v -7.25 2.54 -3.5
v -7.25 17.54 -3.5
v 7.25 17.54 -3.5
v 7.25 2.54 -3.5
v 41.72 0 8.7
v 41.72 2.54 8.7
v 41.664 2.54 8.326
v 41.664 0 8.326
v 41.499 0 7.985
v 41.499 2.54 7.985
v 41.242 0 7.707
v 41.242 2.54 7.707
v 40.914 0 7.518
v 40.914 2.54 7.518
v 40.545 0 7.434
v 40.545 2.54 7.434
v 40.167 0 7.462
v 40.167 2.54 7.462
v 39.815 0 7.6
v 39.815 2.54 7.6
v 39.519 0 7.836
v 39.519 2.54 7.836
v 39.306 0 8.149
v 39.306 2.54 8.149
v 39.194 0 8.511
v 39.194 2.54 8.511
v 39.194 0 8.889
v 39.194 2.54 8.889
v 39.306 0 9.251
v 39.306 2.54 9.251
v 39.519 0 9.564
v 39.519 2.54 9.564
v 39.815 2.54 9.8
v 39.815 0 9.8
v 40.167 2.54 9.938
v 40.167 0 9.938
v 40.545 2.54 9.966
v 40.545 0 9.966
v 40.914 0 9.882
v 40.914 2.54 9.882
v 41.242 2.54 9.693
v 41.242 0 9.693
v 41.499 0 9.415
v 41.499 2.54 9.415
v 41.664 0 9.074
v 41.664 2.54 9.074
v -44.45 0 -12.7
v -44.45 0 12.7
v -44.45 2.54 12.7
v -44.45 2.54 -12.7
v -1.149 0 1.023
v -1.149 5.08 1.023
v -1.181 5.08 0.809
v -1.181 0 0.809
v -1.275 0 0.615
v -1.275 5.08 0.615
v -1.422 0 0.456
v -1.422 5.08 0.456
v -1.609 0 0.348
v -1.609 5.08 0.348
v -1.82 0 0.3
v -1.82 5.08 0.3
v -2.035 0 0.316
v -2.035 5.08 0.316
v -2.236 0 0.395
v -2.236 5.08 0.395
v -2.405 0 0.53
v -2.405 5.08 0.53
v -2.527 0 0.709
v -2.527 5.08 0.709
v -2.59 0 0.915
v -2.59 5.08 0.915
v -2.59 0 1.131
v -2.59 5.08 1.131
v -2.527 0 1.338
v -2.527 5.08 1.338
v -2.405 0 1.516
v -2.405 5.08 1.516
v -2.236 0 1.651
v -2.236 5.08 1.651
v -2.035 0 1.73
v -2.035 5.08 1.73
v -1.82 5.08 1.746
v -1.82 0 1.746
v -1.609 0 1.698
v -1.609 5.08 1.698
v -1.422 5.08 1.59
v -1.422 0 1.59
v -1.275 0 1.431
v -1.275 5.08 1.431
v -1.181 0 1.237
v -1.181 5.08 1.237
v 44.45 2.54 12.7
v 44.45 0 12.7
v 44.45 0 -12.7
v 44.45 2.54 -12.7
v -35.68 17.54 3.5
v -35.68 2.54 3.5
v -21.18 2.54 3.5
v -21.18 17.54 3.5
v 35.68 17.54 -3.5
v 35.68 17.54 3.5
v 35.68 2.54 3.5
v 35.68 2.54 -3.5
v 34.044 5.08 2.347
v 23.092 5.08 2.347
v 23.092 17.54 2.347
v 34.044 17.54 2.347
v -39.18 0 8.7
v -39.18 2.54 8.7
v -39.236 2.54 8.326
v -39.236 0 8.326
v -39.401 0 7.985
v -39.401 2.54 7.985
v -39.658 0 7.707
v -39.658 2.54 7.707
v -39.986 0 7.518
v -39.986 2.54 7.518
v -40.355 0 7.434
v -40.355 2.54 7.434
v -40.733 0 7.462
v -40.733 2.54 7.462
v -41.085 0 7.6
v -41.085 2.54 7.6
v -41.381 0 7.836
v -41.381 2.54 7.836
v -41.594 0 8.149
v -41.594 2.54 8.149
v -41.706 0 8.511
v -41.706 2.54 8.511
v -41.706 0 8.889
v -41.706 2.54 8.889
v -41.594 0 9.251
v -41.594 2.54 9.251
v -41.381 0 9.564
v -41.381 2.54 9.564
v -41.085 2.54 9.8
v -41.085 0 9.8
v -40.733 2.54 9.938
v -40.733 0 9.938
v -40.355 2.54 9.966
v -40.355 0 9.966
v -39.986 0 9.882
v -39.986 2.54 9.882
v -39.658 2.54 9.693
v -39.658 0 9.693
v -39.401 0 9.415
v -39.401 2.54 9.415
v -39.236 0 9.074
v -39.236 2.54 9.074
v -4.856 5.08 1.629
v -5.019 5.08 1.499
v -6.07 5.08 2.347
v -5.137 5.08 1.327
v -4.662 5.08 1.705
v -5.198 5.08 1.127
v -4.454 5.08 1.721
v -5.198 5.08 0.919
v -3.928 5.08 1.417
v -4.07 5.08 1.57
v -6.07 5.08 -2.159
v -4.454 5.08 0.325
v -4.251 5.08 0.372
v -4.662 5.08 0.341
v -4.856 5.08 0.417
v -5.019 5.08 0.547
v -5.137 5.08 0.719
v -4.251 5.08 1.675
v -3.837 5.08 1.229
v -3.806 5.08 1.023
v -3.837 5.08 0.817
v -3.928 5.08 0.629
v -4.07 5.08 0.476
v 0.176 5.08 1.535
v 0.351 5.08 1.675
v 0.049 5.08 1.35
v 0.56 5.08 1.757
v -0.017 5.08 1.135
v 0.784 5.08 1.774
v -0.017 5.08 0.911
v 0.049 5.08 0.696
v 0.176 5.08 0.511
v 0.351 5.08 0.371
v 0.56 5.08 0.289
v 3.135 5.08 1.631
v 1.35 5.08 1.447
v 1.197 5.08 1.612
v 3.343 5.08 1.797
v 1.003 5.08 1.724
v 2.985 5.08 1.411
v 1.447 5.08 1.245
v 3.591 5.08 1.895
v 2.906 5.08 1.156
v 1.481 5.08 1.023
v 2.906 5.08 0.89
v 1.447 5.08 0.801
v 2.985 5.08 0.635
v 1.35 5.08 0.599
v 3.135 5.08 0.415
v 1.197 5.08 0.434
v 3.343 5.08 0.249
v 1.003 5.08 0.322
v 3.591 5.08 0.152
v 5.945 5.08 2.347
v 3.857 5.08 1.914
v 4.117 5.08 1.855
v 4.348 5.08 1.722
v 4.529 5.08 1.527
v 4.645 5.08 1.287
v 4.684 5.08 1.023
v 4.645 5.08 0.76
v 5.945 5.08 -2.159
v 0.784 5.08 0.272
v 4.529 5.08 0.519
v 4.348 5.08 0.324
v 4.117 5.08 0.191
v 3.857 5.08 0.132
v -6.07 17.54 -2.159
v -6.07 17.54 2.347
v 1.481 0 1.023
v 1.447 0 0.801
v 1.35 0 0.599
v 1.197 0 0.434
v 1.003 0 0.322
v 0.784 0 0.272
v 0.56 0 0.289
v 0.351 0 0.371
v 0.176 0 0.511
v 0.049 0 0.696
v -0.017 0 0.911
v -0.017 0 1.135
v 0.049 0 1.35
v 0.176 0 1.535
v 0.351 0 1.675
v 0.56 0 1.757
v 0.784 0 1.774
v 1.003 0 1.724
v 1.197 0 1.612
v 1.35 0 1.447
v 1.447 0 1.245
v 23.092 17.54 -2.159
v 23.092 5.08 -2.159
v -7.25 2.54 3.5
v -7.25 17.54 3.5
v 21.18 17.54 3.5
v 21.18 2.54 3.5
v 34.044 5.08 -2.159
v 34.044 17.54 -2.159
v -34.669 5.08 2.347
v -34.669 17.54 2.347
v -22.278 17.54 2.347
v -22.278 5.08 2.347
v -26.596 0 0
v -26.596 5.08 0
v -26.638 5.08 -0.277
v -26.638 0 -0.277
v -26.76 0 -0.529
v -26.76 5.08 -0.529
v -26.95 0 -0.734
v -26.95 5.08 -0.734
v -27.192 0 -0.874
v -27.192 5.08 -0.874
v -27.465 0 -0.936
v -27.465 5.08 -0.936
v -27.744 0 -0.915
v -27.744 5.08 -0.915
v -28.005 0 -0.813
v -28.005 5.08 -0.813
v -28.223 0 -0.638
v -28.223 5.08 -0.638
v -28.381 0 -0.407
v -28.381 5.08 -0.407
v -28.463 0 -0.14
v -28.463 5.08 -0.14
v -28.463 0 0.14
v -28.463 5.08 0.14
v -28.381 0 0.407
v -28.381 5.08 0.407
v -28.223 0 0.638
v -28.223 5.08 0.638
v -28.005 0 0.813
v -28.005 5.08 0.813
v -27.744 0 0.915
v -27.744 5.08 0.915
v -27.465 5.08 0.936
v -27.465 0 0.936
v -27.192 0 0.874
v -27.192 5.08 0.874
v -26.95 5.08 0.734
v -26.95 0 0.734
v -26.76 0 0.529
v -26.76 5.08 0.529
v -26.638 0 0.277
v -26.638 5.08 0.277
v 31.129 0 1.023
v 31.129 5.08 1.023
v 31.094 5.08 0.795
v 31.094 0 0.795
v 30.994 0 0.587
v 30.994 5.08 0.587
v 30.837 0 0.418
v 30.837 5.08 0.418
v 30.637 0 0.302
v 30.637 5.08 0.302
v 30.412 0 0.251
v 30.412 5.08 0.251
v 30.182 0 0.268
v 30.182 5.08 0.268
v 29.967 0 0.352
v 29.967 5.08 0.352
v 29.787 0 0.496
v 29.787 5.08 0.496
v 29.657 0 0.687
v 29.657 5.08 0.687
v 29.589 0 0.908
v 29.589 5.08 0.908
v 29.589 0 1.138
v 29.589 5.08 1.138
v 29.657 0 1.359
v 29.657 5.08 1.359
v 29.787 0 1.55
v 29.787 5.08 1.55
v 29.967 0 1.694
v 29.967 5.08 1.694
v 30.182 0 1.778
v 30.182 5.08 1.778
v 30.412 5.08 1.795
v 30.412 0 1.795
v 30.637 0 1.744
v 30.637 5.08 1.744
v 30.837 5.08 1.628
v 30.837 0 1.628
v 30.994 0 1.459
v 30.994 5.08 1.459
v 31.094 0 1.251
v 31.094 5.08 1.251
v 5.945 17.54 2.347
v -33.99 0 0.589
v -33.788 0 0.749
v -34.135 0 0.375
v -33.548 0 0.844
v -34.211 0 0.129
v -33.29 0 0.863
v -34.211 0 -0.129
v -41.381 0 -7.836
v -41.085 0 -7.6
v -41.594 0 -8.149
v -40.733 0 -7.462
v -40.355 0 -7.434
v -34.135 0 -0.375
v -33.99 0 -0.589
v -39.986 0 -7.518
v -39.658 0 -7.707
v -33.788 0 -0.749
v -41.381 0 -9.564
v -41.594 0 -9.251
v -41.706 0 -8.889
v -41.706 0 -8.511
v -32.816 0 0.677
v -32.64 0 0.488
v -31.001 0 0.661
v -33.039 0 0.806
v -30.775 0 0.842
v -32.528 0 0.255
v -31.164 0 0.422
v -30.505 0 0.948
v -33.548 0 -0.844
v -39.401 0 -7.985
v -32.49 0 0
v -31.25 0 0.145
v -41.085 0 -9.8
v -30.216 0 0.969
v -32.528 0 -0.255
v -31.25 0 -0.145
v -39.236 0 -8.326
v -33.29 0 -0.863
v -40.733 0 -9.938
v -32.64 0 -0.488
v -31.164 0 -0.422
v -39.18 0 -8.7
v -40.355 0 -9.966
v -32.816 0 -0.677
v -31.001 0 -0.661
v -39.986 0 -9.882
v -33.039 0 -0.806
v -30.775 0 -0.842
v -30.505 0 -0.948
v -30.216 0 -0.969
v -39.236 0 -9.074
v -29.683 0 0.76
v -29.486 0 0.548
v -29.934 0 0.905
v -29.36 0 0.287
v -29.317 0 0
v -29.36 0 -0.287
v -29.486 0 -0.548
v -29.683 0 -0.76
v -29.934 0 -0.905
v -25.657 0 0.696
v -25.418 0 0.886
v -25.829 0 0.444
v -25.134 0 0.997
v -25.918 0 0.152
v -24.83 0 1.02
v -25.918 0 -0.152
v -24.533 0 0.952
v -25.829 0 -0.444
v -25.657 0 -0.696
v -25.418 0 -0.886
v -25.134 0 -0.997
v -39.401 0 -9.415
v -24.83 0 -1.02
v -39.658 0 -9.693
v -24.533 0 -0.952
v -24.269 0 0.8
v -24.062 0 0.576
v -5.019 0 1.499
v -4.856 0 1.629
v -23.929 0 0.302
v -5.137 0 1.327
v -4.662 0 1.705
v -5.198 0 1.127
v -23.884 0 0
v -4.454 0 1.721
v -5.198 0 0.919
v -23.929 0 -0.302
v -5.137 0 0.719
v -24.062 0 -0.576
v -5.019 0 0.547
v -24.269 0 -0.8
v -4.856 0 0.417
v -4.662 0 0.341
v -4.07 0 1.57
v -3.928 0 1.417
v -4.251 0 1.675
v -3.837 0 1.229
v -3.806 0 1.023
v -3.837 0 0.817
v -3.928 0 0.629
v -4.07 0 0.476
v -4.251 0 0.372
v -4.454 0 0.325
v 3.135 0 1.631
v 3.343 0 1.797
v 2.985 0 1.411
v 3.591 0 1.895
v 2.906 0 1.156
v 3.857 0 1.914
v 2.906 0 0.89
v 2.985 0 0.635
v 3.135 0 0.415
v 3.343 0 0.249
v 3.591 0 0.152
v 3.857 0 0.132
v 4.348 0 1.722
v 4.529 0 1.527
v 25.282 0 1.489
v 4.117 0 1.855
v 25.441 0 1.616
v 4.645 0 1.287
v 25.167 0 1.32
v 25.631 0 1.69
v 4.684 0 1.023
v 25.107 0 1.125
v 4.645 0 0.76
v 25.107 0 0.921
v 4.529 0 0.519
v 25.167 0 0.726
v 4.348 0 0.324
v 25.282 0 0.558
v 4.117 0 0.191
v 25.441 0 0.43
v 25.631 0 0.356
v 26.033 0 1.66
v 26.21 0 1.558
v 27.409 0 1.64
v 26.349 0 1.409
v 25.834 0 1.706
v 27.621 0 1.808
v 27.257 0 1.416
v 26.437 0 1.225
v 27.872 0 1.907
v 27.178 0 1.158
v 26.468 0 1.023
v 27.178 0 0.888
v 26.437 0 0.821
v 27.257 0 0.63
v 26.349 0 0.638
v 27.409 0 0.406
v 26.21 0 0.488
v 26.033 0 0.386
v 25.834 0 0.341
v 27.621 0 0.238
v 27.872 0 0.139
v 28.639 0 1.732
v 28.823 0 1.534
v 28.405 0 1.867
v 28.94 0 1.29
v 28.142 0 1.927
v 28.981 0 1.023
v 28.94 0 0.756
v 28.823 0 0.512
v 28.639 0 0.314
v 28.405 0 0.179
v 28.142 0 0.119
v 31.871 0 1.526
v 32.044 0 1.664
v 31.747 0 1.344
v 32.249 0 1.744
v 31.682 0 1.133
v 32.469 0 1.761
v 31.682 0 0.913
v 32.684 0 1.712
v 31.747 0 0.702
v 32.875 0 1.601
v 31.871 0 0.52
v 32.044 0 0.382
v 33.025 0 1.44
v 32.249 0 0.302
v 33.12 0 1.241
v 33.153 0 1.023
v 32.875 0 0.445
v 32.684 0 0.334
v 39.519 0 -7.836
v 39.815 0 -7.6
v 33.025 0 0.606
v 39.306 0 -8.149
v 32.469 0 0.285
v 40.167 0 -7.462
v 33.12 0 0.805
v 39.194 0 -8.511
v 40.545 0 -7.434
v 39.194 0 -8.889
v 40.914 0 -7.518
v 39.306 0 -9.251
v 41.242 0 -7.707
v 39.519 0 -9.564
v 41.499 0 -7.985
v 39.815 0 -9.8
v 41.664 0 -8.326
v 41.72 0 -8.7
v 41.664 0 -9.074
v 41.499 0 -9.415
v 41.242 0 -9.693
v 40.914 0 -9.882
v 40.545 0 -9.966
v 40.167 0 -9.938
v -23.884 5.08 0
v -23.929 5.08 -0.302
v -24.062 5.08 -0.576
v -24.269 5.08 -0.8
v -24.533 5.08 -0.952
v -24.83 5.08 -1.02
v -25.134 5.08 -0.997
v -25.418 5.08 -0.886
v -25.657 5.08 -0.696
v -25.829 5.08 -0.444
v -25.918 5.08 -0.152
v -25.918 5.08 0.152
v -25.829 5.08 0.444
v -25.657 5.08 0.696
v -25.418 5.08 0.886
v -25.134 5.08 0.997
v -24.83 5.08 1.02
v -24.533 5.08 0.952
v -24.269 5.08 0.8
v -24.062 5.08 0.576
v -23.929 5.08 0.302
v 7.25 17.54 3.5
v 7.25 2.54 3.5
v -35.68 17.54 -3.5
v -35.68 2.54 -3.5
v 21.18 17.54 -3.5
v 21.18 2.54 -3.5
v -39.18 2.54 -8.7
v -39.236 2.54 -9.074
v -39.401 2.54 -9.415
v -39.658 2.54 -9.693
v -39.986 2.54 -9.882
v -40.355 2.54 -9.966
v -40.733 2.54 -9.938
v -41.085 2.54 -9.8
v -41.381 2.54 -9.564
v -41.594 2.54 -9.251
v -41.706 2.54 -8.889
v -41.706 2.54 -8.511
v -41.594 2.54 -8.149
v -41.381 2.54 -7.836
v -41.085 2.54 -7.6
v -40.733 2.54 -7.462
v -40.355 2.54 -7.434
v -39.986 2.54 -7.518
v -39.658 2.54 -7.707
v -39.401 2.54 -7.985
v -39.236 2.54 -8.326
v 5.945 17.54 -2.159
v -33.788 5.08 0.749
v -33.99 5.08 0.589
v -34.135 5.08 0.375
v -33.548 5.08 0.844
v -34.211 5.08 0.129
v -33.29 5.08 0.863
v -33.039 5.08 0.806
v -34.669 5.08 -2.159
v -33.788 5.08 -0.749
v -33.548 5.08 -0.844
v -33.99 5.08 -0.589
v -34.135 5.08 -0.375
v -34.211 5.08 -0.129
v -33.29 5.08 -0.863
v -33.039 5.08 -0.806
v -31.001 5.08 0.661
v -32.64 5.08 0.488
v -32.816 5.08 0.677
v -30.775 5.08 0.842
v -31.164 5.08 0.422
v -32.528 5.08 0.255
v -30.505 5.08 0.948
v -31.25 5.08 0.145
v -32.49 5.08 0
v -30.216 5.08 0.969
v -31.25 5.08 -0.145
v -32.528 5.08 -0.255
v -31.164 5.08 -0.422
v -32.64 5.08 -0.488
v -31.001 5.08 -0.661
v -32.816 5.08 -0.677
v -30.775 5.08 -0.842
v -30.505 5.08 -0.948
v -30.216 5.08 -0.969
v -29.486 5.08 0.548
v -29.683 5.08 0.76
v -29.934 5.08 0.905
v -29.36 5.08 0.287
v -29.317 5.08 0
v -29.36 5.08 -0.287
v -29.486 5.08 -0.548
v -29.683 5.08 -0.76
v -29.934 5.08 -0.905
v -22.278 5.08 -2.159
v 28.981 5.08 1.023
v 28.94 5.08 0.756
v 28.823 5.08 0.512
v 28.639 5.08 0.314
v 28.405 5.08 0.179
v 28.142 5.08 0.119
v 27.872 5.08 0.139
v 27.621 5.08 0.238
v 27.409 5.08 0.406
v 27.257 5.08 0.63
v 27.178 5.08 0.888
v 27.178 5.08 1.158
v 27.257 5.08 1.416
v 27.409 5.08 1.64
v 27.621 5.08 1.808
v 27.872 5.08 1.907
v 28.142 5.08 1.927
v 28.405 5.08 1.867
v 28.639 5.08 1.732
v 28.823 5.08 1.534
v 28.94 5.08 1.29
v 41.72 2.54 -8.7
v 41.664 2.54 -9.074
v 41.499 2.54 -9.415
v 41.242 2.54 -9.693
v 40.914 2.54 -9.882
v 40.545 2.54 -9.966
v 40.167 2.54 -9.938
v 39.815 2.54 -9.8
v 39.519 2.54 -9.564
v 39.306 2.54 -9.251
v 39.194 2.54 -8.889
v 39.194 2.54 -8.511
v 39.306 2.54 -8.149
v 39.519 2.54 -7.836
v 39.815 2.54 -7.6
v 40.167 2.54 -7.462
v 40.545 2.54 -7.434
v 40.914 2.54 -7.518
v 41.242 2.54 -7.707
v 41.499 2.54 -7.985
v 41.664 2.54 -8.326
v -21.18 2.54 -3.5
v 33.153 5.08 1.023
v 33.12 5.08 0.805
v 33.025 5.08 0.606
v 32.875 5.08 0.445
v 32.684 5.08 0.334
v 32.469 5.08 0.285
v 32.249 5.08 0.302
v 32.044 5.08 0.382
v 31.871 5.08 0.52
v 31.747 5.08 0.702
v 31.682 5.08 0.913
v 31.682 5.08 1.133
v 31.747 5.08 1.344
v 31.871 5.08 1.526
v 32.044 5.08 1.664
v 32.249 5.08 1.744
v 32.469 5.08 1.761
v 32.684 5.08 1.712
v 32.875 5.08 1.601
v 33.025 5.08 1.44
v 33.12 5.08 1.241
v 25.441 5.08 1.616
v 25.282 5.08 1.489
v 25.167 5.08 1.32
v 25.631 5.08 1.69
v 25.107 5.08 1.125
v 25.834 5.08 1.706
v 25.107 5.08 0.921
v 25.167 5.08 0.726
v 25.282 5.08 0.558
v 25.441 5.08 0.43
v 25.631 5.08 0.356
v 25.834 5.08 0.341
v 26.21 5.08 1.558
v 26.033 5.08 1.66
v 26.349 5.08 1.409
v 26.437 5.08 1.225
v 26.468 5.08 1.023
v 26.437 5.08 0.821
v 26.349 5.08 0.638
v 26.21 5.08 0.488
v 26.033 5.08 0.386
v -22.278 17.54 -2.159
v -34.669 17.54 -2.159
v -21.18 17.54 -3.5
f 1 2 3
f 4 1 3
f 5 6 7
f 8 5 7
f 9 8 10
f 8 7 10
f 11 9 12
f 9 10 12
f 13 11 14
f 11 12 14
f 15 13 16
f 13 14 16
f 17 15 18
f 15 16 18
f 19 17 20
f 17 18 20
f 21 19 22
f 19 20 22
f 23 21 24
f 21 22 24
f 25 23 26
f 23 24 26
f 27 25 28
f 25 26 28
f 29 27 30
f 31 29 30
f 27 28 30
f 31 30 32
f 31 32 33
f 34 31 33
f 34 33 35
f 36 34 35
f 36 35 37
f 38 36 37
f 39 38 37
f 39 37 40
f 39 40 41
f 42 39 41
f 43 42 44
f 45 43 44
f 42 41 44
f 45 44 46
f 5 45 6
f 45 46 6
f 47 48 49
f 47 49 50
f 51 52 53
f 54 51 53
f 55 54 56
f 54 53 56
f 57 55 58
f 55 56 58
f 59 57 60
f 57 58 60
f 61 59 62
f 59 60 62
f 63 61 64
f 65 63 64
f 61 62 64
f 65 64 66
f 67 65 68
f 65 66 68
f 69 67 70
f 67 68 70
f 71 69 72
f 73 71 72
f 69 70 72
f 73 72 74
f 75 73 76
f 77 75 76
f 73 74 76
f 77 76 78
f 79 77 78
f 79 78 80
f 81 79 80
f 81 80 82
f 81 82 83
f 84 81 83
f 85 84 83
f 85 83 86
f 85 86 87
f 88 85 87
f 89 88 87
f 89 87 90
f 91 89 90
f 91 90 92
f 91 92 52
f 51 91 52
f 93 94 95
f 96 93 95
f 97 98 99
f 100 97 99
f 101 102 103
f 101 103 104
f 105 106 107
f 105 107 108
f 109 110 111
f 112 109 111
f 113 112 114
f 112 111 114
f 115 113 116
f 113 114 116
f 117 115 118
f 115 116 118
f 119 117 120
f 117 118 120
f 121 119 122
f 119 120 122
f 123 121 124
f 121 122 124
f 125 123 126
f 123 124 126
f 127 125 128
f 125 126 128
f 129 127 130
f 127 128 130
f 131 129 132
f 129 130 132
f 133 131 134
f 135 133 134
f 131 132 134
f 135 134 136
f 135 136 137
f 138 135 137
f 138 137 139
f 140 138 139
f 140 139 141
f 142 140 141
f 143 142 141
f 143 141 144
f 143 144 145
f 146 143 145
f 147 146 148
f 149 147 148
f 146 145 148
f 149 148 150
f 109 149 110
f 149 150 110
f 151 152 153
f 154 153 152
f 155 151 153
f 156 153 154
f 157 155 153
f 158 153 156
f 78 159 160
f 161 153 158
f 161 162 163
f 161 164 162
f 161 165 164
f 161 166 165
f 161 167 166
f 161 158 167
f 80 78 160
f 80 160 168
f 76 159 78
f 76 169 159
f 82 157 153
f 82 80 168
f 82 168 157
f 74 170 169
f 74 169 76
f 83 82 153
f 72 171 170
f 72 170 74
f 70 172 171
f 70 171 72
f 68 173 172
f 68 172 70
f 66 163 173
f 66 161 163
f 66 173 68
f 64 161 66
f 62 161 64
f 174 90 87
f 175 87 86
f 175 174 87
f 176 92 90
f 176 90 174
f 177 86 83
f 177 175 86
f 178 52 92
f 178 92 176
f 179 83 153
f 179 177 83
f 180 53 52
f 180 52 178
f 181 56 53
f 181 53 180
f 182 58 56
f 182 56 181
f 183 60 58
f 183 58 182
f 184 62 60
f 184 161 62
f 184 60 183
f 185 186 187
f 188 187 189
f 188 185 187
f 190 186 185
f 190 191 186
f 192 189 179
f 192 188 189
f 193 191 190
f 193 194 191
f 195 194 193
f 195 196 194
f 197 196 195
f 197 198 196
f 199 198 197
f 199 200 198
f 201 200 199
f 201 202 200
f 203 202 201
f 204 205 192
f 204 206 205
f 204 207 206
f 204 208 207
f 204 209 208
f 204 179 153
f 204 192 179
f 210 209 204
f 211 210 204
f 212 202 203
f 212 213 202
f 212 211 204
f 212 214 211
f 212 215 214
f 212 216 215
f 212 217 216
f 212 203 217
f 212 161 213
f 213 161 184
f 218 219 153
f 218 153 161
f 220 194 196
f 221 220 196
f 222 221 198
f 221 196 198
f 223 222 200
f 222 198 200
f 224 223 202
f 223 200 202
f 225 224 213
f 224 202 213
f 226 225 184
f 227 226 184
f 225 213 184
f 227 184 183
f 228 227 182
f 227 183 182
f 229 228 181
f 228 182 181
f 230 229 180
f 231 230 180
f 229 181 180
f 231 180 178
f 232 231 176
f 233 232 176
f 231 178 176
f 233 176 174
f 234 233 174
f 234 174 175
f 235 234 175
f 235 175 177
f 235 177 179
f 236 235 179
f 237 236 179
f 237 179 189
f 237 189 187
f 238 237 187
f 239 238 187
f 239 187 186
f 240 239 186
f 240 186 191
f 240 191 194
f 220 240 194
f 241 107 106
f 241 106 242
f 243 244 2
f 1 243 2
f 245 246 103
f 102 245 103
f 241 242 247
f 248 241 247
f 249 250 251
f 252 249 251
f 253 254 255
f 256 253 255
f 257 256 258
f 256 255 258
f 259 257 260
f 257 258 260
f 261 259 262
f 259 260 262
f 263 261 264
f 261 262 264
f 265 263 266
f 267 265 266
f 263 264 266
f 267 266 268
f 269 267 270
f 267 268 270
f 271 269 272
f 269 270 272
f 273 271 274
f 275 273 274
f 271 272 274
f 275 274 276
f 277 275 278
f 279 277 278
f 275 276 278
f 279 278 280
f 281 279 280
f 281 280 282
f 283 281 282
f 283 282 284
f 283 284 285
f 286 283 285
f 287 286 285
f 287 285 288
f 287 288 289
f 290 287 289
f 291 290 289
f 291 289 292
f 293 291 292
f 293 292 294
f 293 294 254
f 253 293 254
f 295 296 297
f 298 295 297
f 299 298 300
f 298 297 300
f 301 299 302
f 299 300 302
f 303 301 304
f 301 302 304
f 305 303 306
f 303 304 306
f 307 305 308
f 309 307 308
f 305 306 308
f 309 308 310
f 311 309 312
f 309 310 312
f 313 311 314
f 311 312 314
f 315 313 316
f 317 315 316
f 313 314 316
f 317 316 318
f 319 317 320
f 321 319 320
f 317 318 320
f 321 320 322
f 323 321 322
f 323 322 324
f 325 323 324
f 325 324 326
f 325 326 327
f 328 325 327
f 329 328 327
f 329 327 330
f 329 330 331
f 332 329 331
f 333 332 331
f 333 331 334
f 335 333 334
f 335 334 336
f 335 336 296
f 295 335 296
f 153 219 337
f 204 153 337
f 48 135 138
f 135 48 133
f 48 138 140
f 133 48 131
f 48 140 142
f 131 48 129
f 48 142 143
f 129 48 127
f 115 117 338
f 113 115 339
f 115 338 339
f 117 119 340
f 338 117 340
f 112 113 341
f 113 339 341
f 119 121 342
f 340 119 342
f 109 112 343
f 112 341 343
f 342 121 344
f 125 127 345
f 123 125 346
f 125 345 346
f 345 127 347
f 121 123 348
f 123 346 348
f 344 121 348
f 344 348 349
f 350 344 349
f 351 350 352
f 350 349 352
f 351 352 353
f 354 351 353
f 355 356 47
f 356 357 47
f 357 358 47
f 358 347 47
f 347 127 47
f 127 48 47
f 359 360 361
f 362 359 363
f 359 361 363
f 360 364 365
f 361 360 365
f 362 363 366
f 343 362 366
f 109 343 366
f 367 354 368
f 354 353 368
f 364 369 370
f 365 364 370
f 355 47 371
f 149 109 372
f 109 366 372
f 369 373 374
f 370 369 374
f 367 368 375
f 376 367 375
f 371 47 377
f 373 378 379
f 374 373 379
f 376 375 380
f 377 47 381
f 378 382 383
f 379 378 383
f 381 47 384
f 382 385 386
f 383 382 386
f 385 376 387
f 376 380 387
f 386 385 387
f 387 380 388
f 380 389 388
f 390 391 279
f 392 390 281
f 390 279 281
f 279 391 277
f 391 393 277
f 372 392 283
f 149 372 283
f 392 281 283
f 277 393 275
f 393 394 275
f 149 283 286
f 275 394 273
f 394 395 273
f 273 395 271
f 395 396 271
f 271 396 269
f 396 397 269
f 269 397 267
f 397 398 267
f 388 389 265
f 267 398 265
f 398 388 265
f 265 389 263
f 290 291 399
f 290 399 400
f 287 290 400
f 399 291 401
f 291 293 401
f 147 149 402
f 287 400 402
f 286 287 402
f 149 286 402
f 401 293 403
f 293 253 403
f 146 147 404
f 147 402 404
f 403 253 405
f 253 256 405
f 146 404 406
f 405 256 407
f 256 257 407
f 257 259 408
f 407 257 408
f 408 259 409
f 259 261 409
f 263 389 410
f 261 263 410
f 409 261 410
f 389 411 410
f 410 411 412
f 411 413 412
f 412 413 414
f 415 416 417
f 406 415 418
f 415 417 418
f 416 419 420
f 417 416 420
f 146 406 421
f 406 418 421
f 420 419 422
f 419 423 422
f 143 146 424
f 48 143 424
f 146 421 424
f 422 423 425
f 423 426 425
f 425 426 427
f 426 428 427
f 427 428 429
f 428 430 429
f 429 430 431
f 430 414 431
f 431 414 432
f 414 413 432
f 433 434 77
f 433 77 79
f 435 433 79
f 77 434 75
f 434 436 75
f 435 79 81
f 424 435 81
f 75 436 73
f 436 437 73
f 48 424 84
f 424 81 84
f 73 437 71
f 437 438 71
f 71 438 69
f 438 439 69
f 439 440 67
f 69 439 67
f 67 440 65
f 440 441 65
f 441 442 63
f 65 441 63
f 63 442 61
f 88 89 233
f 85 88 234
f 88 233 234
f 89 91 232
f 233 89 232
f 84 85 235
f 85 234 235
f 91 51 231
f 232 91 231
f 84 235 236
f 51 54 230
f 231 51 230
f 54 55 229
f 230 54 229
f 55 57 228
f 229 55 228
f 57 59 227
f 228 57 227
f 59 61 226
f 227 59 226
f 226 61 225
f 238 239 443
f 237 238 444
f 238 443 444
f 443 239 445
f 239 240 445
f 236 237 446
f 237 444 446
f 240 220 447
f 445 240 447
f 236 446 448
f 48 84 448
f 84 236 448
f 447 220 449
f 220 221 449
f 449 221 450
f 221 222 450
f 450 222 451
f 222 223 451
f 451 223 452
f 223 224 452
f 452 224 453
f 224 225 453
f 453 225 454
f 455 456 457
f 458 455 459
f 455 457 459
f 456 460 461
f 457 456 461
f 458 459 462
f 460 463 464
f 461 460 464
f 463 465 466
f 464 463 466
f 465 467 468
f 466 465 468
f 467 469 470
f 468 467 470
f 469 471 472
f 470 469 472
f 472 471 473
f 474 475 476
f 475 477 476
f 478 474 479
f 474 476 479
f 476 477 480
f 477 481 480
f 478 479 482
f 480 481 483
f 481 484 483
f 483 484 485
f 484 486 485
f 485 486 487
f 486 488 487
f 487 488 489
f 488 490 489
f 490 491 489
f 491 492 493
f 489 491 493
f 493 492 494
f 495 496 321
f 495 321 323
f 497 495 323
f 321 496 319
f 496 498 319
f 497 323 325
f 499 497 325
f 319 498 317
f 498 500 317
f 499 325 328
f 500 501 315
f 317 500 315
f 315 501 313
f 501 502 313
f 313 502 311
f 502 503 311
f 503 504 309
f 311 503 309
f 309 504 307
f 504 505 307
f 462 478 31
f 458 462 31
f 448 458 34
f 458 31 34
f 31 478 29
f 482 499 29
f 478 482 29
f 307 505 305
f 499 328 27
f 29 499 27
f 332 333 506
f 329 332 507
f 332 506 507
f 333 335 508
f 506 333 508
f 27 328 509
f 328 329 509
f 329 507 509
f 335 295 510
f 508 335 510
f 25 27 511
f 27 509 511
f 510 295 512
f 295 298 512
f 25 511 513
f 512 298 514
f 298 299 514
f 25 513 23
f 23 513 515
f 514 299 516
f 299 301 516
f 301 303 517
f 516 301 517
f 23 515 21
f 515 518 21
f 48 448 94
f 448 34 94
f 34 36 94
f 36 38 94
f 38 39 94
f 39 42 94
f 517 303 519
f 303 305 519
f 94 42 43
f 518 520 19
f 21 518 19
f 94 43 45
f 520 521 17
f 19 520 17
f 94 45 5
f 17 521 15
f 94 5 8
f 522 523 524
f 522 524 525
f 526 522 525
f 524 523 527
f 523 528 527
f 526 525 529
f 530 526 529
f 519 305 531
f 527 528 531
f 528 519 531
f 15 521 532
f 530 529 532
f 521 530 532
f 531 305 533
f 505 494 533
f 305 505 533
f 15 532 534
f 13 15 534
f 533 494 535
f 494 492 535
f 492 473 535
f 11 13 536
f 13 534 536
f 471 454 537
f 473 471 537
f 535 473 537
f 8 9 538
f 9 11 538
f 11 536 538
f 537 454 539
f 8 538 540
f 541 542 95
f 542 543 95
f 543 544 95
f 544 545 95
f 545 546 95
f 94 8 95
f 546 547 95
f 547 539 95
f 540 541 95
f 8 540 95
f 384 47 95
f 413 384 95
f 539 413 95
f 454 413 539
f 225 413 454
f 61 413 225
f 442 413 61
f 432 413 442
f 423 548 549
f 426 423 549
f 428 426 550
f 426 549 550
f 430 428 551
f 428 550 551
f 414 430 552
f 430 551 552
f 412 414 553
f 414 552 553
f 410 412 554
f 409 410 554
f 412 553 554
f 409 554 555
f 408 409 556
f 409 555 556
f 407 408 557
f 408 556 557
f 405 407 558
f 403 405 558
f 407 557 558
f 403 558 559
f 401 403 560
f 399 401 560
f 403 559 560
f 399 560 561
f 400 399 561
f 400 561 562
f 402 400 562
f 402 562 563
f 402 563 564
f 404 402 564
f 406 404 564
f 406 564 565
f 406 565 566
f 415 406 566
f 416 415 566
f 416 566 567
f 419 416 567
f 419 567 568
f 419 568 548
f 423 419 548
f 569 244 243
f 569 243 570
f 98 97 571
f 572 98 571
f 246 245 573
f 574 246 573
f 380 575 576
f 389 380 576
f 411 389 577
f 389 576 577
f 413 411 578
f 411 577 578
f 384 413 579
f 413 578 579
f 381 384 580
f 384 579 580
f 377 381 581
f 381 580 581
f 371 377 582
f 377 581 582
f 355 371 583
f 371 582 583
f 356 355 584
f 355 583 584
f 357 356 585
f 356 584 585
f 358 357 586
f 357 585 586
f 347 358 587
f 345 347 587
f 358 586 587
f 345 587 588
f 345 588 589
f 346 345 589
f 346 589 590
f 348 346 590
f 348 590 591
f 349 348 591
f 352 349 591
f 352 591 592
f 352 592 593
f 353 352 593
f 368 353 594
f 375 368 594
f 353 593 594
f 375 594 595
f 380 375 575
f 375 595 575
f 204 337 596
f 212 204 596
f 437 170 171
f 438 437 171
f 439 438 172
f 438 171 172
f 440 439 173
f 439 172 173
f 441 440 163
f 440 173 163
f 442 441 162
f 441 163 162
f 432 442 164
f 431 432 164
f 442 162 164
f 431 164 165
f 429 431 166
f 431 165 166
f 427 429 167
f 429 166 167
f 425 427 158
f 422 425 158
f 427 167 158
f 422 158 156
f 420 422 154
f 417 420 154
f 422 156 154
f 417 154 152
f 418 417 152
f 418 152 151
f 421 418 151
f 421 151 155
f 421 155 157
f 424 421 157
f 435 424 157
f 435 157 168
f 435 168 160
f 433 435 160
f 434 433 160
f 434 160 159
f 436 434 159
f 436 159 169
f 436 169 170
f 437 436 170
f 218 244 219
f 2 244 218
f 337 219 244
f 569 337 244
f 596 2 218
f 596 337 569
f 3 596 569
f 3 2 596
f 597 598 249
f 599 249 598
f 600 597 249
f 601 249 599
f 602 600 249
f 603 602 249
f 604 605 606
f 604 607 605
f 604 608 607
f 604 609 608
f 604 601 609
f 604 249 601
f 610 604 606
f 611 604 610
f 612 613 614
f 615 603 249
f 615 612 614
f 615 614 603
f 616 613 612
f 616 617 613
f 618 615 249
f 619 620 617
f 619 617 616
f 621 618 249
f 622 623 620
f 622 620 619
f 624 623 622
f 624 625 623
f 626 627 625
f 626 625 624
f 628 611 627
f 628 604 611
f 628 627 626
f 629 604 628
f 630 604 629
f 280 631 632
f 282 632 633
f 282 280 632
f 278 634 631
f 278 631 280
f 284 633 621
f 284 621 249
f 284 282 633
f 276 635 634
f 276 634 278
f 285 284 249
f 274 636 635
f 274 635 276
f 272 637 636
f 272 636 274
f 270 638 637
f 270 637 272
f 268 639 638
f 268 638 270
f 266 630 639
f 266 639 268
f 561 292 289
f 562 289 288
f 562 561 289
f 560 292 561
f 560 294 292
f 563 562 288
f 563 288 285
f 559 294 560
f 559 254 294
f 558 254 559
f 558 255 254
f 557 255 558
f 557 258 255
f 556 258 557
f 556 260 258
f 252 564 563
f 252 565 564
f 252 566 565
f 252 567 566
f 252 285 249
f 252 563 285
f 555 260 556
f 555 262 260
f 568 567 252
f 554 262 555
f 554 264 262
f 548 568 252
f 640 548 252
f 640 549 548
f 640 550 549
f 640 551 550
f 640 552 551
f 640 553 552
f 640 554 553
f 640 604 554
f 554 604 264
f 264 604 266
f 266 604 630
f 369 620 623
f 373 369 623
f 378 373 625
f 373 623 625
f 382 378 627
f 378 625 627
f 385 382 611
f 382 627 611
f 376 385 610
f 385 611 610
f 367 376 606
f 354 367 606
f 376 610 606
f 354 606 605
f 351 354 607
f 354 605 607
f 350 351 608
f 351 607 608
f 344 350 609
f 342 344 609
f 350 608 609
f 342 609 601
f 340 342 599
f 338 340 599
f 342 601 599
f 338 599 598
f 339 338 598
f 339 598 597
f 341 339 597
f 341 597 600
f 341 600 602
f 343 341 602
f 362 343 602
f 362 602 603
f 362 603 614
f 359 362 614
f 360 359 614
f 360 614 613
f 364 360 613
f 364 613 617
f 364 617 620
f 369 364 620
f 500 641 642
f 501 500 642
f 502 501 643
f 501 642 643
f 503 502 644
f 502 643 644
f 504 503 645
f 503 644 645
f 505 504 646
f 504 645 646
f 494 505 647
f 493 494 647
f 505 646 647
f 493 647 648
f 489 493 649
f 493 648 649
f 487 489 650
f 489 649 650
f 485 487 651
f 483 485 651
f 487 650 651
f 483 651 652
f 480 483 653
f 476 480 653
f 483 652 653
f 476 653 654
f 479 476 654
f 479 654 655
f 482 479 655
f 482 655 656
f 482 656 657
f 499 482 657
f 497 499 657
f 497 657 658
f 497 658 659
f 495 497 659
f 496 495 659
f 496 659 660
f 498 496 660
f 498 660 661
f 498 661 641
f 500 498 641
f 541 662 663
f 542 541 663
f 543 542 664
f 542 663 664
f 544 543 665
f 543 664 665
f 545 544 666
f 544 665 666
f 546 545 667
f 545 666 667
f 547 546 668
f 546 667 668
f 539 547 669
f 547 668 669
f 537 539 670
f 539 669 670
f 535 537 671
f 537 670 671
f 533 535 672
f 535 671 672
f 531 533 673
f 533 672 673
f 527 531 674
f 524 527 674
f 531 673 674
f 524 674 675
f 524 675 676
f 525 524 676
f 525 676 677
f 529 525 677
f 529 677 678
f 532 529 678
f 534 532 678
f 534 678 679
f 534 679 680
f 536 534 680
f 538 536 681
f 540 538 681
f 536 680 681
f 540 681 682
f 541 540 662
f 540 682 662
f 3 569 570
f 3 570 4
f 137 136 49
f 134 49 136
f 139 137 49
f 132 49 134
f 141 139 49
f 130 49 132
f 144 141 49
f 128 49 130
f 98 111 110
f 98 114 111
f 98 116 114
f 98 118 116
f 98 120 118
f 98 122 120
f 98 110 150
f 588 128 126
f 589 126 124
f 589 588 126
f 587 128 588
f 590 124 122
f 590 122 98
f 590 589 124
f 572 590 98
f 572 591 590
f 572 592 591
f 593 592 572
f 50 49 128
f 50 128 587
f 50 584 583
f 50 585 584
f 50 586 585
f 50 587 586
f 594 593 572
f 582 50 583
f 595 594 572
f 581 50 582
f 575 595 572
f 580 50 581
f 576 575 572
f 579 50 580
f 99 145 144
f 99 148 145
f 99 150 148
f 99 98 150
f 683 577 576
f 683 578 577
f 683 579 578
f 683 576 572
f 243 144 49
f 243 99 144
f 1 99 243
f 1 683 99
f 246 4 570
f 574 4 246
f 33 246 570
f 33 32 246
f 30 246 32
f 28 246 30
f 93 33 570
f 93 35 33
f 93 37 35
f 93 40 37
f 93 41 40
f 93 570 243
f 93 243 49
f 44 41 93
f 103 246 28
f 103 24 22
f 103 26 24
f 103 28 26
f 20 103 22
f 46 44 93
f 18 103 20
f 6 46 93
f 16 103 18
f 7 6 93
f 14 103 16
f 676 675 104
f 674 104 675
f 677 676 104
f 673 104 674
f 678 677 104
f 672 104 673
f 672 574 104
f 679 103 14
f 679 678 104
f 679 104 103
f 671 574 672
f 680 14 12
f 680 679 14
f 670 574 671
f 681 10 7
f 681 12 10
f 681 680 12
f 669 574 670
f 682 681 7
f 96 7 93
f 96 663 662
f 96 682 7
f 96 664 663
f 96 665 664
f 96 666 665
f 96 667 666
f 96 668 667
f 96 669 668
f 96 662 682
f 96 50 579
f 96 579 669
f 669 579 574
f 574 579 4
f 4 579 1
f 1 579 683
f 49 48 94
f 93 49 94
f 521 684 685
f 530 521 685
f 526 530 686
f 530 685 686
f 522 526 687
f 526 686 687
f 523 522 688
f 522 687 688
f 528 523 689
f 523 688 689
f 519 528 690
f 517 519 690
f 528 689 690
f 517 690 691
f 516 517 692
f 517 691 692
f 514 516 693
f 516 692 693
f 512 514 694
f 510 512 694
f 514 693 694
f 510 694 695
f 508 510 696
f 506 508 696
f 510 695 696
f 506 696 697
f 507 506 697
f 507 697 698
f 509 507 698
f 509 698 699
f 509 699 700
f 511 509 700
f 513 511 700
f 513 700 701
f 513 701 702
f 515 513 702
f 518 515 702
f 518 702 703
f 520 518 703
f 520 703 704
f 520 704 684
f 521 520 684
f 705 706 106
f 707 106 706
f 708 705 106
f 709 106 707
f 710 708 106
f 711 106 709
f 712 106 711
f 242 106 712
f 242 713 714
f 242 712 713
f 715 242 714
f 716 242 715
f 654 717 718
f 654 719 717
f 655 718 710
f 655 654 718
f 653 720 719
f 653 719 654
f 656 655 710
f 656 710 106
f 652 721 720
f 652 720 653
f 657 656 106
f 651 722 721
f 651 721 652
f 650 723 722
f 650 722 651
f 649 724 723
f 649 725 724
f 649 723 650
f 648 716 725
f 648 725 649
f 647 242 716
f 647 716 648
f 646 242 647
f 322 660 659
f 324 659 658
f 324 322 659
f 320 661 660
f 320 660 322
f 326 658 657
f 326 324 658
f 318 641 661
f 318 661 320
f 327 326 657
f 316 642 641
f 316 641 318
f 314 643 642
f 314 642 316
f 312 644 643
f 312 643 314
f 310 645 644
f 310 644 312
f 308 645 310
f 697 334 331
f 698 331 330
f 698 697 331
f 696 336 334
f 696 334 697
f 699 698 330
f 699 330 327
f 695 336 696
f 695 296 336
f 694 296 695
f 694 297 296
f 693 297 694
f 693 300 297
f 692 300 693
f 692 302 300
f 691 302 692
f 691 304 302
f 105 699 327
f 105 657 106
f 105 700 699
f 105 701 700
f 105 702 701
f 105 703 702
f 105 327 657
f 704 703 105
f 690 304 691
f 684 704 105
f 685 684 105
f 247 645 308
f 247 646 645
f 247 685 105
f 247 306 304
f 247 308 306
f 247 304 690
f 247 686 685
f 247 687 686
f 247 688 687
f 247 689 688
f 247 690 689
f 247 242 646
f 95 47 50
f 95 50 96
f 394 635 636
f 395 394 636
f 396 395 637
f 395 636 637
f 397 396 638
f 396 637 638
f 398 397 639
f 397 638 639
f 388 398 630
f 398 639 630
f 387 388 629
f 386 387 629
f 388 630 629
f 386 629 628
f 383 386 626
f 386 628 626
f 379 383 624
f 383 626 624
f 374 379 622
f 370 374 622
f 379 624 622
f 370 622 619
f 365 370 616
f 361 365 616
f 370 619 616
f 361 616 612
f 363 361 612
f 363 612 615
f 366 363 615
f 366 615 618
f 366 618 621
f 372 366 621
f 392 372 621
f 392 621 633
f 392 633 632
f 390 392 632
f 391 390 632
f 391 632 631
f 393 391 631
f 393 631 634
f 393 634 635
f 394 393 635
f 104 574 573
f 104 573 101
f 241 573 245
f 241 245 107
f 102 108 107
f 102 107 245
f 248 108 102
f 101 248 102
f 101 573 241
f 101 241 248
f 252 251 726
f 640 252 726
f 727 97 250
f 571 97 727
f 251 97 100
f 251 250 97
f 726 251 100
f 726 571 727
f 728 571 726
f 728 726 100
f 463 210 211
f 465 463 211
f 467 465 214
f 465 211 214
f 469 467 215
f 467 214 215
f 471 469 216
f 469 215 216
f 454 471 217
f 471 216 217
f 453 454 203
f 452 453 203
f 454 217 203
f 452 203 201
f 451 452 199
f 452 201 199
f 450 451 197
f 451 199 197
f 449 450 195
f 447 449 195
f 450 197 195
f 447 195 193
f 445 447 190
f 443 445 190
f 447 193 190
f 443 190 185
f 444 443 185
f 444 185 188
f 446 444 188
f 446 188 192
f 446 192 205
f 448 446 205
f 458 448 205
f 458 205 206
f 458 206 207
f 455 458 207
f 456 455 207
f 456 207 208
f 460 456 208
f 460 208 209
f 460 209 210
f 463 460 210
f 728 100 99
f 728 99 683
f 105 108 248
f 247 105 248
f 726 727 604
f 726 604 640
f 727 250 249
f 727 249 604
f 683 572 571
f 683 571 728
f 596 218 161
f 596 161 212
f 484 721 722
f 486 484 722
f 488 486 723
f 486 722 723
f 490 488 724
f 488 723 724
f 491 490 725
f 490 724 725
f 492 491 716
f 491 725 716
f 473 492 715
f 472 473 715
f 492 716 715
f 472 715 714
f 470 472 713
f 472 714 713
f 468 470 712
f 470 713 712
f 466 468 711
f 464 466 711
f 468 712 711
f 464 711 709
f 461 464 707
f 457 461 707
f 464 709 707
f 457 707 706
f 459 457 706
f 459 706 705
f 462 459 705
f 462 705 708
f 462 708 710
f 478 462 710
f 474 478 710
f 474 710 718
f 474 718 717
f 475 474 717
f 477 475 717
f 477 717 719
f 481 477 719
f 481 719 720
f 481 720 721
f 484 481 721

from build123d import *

# Parameters (mm, degrees)
SKETCH1_W           = 88.9
SKETCH1_H           = 25.4
BOSS_EXTRUDE1_DEPTH = 2.54
SKETCH2_R           = 1.27
CUT_EXTRUDE1_DEPTH  = 2.54
SKETCH16_W          = 14.499999956
SKETCH16_H          = 6.99999997
BOSS_EXTRUDE3_DEPTH = 14.999999972
SKETCH17_W          = 12.390836481
SKETCH17_H          = 4.505758721
SKETCH17_W_2        = 12.015356588
SKETCH17_W_3        = 10.95149689
CUT_EXTRUDE4_DEPTH  = 12.459999972
SKETCH18_R          = 0.865438392
SKETCH18_R_2        = 0.972006337
SKETCH18_R_3        = 0.938699733
SKETCH18_R_4        = 1.023043952
SKETCH18_R_5        = 0.699865796
SKETCH18_R_6        = 0.72485584
SKETCH18_R_7        = 0.753208606
SKETCH18_R_8        = 0.89391984
SKETCH18_R_9        = 0.684371717
SKETCH18_R_10       = 0.906595882
SKETCH18_R_11       = 0.774291856
SKETCH18_R_12       = 0.739788643
CUT_EXTRUDE5_DEPTH  = 12.459999972


with BuildPart() as part:
    # Sketch1 → Boss-Extrude1 (new body)
    with BuildSketch(Plane(origin=(0, 0, 0), x_dir=(1, 0, 0), z_dir=(0, 1, 0))):
        Rectangle(SKETCH1_W, SKETCH1_H)
    extrude(amount=BOSS_EXTRUDE1_DEPTH)

    # Sketch2 → Cut-Extrude1 (cut)
    with BuildSketch(Plane(origin=(0, 2.54, 0), x_dir=(1, 0, 0), z_dir=(0, 1, 0))):
        with Locations((-40.45, 8.7)):
            Circle(SKETCH2_R)
        with Locations((-40.45, -8.7)):
            Circle(SKETCH2_R)
        with Locations((40.45, -8.7)):
            Circle(SKETCH2_R)
        with Locations((40.45, 8.7)):
            Circle(SKETCH2_R)
    extrude(amount=-CUT_EXTRUDE1_DEPTH, mode=Mode.SUBTRACT)

    # Sketch16 → Boss-Extrude3 (add)
    with BuildSketch(Plane(origin=(0, 2.54, 0), x_dir=(1, 0, 0), z_dir=(0, 1, 0))):
        Rectangle(SKETCH16_W, SKETCH16_H)
        with Locations((28.430000036, 1.27e-07)):
            Rectangle(SKETCH16_W, SKETCH16_H)
        with Locations((-28.430000036, 1.27e-07)):
            Rectangle(SKETCH16_W, SKETCH16_H)
    extrude(amount=BOSS_EXTRUDE3_DEPTH)

    # Sketch17 → Cut-Extrude4 (cut)
    with BuildSketch(Plane(origin=(0, 17.539999972, 0), x_dir=(1, 0, 0), z_dir=(0, 1, 0))):
        with Locations((-28.473891916, -0.093869973)):
            Rectangle(SKETCH17_W, SKETCH17_H)
        with Locations((-0.062579982, -0.093869973)):
            Rectangle(SKETCH17_W_2, SKETCH17_H)
        with Locations((28.567761889, -0.093869973)):
            Rectangle(SKETCH17_W_3, SKETCH17_H)
    extrude(amount=-CUT_EXTRUDE4_DEPTH, mode=Mode.SUBTRACT)

    # Sketch18 → Cut-Extrude5 (cut)
    with BuildSketch(Plane(origin=(0, 5.08, 0), x_dir=(1, 0, 0), z_dir=(0, 1, 0))):
        with Locations((-33.35513053, 0)):
            Circle(SKETCH18_R)
        with Locations((-30.2887114, 0)):
            Circle(SKETCH18_R_2)
        with Locations((-27.535192182, 0)):
            Circle(SKETCH18_R_3)
        with Locations((-24.906832928, 0)):
            Circle(SKETCH18_R_4)
        with Locations((-4.506191176, -1.023043952)):
            Circle(SKETCH18_R_5)
        with Locations((-1.873685579, -1.023043952)):
            Circle(SKETCH18_R_6)
        with Locations((0.727684736, -1.023043952)):
            Circle(SKETCH18_R_7)
        with Locations((3.790367697, -1.023043952)):
            Circle(SKETCH18_R_8)
        with Locations((25.783303286, -1.023043952)):
            Circle(SKETCH18_R_9)
        with Locations((28.074005802, -1.023043952)):
            Circle(SKETCH18_R_10)
        with Locations((30.354212641, -1.023043952)):
            Circle(SKETCH18_R_11)
        with Locations((32.413417846, -1.023043952)):
            Circle(SKETCH18_R_12)
    extrude(amount=-CUT_EXTRUDE5_DEPTH, mode=Mode.SUBTRACT)


solid = part.part
